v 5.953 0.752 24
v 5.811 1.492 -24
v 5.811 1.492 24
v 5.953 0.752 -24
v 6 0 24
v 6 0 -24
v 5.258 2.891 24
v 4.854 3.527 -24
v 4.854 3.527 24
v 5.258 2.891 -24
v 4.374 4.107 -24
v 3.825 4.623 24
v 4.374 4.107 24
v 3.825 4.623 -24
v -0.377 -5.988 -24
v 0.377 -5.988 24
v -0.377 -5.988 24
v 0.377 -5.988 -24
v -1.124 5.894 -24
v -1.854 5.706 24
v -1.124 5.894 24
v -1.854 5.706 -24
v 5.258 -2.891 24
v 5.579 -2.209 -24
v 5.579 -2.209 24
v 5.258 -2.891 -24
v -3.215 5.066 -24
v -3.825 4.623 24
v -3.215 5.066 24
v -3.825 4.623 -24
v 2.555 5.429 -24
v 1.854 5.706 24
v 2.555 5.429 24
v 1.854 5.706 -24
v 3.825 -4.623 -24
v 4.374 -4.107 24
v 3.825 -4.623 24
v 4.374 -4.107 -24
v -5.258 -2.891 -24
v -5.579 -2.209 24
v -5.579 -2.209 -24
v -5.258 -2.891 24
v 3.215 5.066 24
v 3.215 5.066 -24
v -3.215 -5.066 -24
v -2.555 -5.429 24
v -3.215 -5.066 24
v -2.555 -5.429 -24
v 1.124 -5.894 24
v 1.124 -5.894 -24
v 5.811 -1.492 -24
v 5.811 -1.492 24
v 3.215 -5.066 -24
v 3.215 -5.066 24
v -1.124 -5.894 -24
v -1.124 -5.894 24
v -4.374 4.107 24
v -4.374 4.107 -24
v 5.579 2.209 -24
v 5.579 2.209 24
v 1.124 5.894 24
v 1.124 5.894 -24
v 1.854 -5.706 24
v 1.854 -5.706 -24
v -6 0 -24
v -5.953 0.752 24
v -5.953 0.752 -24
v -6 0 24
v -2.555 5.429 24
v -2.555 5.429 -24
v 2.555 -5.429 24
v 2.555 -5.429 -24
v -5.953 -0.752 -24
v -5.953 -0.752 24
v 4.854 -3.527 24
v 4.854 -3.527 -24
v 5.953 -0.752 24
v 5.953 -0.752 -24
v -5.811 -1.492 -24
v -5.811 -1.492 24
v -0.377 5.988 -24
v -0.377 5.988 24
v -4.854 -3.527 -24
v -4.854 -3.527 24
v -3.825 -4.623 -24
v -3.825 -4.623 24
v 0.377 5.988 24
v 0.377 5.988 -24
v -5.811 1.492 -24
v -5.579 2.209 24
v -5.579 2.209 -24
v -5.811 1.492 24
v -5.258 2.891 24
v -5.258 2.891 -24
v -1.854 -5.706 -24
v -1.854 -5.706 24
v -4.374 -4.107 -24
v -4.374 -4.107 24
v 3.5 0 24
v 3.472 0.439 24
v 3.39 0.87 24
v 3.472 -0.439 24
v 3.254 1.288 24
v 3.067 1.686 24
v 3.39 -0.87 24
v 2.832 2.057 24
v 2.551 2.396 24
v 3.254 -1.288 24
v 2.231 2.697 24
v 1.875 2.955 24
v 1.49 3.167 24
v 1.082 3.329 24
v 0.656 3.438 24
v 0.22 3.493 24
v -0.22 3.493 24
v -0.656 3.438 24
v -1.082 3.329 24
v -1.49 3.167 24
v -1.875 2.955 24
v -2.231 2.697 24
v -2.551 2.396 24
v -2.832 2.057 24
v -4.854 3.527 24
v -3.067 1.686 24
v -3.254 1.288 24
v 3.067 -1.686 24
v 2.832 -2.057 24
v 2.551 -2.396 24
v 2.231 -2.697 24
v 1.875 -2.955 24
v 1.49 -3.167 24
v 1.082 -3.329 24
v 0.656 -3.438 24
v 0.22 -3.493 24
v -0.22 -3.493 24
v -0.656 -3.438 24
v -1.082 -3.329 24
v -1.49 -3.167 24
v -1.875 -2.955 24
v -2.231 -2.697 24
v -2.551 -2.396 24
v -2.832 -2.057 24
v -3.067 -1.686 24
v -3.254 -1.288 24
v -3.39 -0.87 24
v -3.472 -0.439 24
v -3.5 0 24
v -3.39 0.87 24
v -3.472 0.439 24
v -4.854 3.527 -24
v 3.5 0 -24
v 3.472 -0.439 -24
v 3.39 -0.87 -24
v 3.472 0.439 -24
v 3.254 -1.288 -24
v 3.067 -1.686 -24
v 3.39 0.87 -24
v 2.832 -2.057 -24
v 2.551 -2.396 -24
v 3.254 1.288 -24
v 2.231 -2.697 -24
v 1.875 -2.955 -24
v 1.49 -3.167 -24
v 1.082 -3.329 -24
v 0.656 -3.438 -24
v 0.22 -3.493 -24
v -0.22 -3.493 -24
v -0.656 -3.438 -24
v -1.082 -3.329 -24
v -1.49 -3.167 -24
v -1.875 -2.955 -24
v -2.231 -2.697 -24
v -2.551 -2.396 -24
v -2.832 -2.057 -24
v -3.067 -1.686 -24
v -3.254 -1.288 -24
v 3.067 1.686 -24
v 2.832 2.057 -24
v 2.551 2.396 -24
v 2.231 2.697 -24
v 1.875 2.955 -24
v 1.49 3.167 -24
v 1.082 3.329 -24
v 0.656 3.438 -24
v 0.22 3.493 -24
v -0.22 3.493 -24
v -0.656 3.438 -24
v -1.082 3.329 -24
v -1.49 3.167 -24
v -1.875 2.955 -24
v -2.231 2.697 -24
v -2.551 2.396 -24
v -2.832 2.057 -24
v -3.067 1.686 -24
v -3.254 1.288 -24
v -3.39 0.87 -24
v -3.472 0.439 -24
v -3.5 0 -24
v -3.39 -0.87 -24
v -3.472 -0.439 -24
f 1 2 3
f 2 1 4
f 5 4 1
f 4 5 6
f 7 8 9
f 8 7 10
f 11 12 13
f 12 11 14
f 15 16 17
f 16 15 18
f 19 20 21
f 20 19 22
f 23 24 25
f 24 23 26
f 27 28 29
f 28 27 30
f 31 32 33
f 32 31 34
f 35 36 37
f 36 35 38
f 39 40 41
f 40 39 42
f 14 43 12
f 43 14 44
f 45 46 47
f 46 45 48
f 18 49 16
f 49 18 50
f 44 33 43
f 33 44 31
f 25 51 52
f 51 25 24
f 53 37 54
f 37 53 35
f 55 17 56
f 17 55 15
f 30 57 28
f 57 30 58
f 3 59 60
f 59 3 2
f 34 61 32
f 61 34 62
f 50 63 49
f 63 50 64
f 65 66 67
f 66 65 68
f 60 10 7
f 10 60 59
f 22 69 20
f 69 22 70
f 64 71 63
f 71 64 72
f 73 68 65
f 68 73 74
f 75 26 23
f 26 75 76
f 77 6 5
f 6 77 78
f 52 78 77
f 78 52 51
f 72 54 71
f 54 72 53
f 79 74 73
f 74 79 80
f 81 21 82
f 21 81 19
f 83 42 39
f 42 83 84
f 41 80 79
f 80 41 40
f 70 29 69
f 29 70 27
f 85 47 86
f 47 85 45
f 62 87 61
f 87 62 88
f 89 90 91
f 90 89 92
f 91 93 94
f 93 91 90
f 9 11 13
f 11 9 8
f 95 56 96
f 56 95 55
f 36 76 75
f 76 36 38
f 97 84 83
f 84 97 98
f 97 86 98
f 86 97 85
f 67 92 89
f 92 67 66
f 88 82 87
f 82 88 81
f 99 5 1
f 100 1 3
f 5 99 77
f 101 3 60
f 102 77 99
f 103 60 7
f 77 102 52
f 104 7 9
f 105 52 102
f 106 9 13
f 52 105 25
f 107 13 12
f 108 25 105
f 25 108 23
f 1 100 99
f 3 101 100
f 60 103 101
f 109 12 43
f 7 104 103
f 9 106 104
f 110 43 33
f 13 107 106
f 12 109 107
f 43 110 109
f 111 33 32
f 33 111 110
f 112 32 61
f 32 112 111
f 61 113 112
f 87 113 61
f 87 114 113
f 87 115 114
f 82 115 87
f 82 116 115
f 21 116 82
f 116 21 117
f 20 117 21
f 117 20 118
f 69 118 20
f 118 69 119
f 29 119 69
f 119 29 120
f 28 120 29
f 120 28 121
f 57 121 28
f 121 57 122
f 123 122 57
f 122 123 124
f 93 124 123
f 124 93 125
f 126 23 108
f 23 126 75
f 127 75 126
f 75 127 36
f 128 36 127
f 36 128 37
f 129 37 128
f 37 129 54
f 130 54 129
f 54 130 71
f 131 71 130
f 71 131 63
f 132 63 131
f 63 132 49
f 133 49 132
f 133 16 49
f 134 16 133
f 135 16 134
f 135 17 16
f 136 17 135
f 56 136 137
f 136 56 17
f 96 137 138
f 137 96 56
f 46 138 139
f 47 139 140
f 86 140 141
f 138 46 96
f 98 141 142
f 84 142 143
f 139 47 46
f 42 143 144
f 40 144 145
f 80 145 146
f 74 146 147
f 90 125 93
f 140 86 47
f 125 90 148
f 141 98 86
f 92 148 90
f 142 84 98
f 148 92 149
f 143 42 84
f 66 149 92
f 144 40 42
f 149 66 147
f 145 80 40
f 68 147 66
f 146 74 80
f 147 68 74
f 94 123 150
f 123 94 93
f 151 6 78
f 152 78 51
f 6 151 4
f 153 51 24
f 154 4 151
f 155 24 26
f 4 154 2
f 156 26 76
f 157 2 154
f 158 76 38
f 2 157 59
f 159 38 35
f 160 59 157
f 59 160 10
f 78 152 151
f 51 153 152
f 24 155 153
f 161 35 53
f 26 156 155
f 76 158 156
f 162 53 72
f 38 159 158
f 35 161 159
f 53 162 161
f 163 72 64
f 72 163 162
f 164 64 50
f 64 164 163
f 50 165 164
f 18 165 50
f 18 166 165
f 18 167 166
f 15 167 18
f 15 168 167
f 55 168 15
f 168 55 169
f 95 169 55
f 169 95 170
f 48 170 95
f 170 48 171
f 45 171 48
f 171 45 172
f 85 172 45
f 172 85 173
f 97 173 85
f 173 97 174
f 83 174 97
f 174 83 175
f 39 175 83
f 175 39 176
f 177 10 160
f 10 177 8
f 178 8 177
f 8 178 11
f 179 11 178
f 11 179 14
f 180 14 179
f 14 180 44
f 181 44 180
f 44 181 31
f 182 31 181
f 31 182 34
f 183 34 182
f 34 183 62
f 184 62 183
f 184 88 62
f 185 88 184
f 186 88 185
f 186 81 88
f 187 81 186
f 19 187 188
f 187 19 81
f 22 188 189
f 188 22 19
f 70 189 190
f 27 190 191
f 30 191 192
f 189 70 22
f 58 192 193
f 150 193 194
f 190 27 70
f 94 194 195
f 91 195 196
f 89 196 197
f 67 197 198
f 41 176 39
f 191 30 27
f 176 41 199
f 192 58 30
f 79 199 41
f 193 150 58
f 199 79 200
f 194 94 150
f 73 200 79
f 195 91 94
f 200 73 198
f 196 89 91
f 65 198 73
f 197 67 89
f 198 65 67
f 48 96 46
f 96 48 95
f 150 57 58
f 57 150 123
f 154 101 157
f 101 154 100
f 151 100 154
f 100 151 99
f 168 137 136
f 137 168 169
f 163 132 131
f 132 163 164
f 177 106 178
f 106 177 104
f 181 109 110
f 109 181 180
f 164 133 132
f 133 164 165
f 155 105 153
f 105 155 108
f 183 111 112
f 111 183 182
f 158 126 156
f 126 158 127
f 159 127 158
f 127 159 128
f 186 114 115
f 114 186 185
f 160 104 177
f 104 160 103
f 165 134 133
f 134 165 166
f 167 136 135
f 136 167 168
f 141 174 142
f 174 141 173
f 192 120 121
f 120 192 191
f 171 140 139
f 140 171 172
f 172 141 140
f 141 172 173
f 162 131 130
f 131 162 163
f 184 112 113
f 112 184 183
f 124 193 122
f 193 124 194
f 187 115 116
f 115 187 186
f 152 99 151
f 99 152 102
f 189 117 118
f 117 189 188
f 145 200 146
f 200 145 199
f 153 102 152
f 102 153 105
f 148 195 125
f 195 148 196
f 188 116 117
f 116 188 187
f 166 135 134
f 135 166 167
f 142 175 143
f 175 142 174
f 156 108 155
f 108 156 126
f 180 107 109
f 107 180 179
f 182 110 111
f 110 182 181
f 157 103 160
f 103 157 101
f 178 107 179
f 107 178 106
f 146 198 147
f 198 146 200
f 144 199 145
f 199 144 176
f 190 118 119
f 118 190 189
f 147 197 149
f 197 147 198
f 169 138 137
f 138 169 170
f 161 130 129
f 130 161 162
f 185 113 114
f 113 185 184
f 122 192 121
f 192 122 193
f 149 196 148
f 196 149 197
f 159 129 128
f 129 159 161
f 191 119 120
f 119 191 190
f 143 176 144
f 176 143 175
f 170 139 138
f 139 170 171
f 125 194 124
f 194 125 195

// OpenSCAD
$fn = 50;


difference() {
	union() {
		translate(v = [0, 0, -24.0000000000]) {
			cylinder(h = 48, r = 6.0000000000);
		}
	}
	union() {
		translate(v = [0, 0, -100.0000000000]) {
			cylinder(h = 200, r = 3.5000000000);
		}
	}
}
